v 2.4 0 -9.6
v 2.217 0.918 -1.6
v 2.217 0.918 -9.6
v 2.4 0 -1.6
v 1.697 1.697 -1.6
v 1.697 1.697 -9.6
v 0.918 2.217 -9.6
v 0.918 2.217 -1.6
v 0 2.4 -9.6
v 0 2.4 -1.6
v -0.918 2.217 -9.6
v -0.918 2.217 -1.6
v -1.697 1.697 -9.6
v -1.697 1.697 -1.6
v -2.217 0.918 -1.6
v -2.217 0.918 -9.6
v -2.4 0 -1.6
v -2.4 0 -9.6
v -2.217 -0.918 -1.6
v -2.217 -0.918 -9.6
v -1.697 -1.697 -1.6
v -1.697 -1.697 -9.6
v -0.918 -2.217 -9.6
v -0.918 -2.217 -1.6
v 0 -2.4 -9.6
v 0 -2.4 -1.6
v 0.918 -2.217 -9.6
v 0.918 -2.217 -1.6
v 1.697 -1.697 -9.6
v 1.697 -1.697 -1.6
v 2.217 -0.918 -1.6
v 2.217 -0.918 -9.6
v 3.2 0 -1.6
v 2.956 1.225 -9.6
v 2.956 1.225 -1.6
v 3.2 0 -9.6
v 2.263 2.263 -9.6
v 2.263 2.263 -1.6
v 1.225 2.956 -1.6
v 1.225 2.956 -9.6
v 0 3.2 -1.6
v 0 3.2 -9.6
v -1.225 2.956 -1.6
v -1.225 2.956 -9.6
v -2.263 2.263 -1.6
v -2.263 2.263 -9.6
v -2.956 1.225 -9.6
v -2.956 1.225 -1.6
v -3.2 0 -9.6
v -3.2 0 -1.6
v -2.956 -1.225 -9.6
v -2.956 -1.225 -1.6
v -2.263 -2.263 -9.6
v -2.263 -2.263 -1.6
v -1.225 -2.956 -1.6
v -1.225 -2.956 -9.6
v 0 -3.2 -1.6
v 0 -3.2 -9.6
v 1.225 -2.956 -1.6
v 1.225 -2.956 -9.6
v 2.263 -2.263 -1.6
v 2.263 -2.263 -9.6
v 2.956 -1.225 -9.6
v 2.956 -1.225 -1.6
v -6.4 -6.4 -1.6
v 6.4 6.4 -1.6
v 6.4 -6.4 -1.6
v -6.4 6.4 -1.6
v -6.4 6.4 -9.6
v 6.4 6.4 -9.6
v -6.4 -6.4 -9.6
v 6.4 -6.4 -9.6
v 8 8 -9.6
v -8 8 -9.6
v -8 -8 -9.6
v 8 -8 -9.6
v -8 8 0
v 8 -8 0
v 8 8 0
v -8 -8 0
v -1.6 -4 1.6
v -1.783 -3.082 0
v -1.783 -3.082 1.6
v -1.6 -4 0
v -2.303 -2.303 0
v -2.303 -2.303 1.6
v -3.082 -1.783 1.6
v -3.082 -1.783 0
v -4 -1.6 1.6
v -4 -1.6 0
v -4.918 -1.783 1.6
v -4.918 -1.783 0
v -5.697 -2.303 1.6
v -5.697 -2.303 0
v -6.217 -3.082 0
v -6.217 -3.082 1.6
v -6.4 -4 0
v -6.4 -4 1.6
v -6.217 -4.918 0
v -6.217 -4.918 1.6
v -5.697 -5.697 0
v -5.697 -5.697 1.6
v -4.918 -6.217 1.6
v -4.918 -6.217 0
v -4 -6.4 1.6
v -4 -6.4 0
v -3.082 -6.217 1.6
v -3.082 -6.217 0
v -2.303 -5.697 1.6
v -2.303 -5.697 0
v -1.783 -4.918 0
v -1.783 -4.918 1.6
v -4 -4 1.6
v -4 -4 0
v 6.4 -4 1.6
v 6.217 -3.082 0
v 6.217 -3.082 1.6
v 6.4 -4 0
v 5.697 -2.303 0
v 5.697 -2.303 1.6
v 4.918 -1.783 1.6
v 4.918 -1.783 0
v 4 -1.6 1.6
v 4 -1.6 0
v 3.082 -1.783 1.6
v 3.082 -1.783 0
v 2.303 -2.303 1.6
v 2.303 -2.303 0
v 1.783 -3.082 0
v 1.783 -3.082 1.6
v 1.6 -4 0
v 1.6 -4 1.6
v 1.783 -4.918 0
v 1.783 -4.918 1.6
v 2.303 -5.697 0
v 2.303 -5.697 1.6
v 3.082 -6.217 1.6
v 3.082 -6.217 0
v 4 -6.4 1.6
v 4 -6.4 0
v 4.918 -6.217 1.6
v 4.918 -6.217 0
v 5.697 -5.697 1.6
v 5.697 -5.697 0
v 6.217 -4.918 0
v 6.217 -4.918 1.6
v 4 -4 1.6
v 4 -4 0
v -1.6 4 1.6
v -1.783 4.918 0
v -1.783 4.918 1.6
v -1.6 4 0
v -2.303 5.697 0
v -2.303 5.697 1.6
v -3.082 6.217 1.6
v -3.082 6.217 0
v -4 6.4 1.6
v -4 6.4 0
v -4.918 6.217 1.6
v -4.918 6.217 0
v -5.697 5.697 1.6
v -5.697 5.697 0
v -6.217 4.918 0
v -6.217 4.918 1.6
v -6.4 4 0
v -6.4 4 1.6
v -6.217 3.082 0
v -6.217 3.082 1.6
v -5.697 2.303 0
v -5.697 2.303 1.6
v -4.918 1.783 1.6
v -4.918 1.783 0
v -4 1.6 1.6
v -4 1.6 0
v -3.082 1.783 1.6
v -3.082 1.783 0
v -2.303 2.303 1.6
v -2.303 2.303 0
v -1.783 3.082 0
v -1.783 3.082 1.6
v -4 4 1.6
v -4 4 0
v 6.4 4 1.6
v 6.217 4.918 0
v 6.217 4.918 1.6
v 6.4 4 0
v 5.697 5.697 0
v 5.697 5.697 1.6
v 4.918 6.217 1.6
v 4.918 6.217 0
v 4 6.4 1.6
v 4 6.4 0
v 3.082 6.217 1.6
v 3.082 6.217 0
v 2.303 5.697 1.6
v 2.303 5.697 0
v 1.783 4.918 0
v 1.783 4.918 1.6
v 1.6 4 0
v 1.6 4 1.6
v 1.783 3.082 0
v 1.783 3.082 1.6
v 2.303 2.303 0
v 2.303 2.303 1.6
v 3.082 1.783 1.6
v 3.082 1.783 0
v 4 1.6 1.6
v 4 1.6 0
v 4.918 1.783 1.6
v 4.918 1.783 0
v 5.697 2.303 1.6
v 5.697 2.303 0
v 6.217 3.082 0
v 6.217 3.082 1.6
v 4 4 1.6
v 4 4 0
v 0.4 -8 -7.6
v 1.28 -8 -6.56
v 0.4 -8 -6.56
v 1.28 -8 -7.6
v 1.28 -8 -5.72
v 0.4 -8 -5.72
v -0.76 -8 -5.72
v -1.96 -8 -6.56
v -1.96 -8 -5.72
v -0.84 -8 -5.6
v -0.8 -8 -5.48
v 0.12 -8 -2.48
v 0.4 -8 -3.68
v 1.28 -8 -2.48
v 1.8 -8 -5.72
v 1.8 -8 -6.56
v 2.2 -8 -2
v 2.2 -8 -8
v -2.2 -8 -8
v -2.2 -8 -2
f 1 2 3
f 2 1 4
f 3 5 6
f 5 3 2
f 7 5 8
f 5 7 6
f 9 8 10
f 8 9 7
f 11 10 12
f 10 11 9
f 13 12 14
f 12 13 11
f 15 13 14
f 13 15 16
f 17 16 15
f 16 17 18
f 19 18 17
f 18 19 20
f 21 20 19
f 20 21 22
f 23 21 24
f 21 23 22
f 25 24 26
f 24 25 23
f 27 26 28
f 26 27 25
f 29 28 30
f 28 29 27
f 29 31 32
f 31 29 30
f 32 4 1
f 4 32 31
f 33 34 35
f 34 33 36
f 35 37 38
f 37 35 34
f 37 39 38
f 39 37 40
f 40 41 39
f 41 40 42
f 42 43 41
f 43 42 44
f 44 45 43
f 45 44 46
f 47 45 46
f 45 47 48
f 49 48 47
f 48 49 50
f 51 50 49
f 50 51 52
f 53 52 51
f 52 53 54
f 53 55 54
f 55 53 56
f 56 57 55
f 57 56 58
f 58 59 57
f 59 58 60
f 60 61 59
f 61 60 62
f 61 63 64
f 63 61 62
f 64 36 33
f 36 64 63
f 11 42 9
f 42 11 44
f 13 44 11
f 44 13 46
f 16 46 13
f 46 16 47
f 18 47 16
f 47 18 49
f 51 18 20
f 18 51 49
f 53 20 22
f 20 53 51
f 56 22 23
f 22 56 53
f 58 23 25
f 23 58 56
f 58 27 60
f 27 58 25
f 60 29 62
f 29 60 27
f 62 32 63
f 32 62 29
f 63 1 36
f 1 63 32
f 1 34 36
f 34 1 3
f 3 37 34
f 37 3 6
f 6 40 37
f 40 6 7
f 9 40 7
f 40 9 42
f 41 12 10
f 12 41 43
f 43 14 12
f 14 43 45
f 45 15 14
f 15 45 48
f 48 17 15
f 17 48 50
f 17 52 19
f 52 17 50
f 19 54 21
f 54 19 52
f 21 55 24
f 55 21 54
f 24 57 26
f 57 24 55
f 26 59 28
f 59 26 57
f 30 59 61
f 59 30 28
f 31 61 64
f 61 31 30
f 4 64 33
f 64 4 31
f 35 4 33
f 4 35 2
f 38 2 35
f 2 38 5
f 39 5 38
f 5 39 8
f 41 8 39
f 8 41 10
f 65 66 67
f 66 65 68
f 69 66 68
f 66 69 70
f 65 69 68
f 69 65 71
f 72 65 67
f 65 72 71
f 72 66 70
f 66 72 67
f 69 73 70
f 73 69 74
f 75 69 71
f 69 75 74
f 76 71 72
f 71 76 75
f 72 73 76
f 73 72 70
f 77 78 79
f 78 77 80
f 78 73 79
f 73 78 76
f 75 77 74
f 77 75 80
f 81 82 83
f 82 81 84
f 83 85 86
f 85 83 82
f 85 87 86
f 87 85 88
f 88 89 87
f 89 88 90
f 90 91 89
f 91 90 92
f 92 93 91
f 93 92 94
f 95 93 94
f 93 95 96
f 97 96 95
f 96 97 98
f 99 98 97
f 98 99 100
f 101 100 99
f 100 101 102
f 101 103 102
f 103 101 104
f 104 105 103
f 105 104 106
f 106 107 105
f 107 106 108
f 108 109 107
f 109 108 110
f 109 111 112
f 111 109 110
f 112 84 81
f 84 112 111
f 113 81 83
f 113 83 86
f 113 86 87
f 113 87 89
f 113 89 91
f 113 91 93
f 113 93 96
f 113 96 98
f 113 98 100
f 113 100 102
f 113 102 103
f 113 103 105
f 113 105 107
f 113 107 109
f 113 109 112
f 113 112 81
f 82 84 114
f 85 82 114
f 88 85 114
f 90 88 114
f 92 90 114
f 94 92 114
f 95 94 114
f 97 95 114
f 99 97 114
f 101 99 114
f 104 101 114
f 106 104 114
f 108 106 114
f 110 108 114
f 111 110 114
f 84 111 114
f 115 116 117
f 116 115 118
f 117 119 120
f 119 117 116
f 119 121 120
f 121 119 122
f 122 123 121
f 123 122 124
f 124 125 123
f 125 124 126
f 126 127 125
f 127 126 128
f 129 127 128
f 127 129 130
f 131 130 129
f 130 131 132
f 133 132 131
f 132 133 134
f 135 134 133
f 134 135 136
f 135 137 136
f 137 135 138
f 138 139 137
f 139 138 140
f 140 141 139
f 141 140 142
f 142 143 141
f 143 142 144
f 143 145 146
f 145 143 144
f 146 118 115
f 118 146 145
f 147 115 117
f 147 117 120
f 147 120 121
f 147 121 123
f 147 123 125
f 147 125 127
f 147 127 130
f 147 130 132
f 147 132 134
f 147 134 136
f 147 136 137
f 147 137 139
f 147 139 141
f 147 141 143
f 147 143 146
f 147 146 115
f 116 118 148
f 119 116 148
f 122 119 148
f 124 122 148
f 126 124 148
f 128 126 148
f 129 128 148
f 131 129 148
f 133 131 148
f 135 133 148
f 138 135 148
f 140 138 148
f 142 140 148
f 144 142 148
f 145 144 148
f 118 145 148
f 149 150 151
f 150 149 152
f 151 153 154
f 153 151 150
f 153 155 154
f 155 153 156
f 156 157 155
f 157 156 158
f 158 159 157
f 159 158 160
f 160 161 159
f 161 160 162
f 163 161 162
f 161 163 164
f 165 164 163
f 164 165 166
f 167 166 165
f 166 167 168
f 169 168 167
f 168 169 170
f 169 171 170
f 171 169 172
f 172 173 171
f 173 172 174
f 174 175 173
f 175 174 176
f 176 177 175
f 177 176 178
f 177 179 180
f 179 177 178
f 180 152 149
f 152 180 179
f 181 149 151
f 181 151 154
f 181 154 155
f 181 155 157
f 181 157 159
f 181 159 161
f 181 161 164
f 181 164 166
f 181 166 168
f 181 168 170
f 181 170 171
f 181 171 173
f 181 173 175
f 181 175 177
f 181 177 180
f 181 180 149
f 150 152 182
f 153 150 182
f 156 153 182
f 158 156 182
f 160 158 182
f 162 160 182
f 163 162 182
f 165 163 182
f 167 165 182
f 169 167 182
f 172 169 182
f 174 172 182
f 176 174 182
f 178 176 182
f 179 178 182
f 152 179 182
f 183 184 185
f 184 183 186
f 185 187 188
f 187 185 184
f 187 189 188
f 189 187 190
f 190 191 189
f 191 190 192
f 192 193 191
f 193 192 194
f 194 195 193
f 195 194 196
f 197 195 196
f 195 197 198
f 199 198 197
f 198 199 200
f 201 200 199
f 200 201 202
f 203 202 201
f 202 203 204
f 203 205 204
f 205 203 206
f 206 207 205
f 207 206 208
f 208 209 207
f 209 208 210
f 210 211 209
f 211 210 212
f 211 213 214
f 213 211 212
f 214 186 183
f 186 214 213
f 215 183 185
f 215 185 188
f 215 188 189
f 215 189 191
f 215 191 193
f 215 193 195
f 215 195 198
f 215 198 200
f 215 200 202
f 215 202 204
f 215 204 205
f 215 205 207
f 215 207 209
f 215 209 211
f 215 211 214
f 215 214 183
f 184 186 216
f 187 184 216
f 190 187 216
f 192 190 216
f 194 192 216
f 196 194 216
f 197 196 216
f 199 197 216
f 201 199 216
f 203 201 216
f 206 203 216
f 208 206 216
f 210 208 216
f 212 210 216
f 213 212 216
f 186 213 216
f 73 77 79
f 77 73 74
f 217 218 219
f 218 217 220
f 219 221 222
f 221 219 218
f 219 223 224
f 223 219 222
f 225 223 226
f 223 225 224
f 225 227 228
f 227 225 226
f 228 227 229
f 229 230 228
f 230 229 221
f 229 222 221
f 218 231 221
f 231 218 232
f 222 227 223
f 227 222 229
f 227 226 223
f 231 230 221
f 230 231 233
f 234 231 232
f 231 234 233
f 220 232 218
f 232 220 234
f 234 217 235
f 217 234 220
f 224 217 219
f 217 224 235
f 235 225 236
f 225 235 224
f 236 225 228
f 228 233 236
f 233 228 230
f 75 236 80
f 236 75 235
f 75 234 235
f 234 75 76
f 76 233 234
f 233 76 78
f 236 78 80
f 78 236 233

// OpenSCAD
// file: ../p/4-4disc.scad
use <../lib.scad>
function ldraw_lib__4_4disc() = [
// 0 Disc 1.0
// 0 Name: 4-4disc.dat
// 0 Author: James Jessiman
// 0 !LDRAW_ORG Primitive UPDATE 2002-02
// 0 !LICENSE Licensed under CC BY 2.0 and CC BY 4.0 : see CAreadme.txt
// 
// 0 BFC CERTIFY CCW
  [0,"BFC","CERTIFY"],
  [0,"BFC","CCW"],
// 
// 0 !HISTORY 1998-12-15 [PTadmin] Official Update 1998-10
// 0 !HISTORY 2002-03-23 [sbliss] Added BFC statement
// 0 !HISTORY 2002-04-25 [PTadmin] Official Update 2002-02
// 0 !HISTORY 2007-06-24 [PTadmin] Header formatted for Contributor Agreement
// 0 !HISTORY 2008-07-01 [PTadmin] Official Update 2008-01
// 
// 
// 3 16 0 0 0 1 0 0 0.9239 0 0.3827
  [3,16,0,0,0,1,0,0,0.9239,0,0.3827],
// 3 16 0 0 0 0.9239 0 0.3827 0.7071 0 0.7071
  [3,16,0,0,0,0.9239,0,0.3827,0.7071,0,0.7071],
// 3 16 0 0 0 0.7071 0 0.7071 0.3827 0 0.9239
  [3,16,0,0,0,0.7071,0,0.7071,0.3827,0,0.9239],
// 3 16 0 0 0 0.3827 0 0.9239 0 0 1
  [3,16,0,0,0,0.3827,0,0.9239,0,0,1],
// 3 16 0 0 0 0 0 1 -0.3827 0 0.9239
  [3,16,0,0,0,0,0,1,-0.3827,0,0.9239],
// 3 16 0 0 0 -0.3827 0 0.9239 -0.7071 0 0.7071
  [3,16,0,0,0,-0.3827,0,0.9239,-0.7071,0,0.7071],
// 3 16 0 0 0 -0.7071 0 0.7071 -0.9239 0 0.3827
  [3,16,0,0,0,-0.7071,0,0.7071,-0.9239,0,0.3827],
// 3 16 0 0 0 -0.9239 0 0.3827 -1 0 -0
  [3,16,0,0,0,-0.9239,0,0.3827,-1,0,-0],
// 3 16 0 0 0 -1 0 -0 -0.9239 0 -0.3827
  [3,16,0,0,0,-1,0,-0,-0.9239,0,-0.3827],
// 3 16 0 0 0 -0.9239 0 -0.3827 -0.7071 0 -0.7071
  [3,16,0,0,0,-0.9239,0,-0.3827,-0.7071,0,-0.7071],
// 3 16 0 0 0 -0.7071 0 -0.7071 -0.3827 0 -0.9239
  [3,16,0,0,0,-0.7071,0,-0.7071,-0.3827,0,-0.9239],
// 3 16 0 0 0 -0.3827 0 -0.9239 0 0 -1
  [3,16,0,0,0,-0.3827,0,-0.9239,0,0,-1],
// 3 16 0 0 0 0 0 -1 0.3827 0 -0.9239
  [3,16,0,0,0,0,0,-1,0.3827,0,-0.9239],
// 3 16 0 0 0 0.3827 0 -0.9239 0.7071 0 -0.7071
  [3,16,0,0,0,0.3827,0,-0.9239,0.7071,0,-0.7071],
// 3 16 0 0 0 0.7071 0 -0.7071 0.9239 0 -0.3827
  [3,16,0,0,0,0.7071,0,-0.7071,0.9239,0,-0.3827],
// 3 16 0 0 0 0.9239 0 -0.3827 1 0 0
  [3,16,0,0,0,0.9239,0,-0.3827,1,0,0],
// 0
];
module ldraw_lib__4_4disc(step=0, col=false, unit=2/5, alt=false, line=0.2, solid=!$preview)
    makepoly(ldraw_lib__4_4disc(), step=step, col=col, unit=unit, alt=alt, line=line, solid=solid);
ldraw_lib__4_4disc(line=0.2);
// file: ../p/stud.scad
use <../lib.scad>
use <4-4cyli.scad>
use <4-4disc.scad>
use <4-4edge.scad>
function ldraw_lib__stud() = [
// 0 Stud
// 0 Name: stud.dat
// 0 Author: James Jessiman
// 0 !LDRAW_ORG Primitive UPDATE 2012-01
// 0 !LICENSE Licensed under CC BY 4.0 : see CAreadme.txt
// 
// 0 BFC CERTIFY CCW
  [0,"BFC","CERTIFY"],
  [0,"BFC","CCW"],
// 
// 0 !HISTORY 2002-04-04 [sbliss] Modified for BFC compliance
// 0 !HISTORY 2002-04-25 [PTadmin] Official Update 2002-02
// 0 !HISTORY 2007-06-24 [PTadmin] Header formatted for Contributor Agreement
// 0 !HISTORY 2008-07-01 [PTadmin] Official Update 2008-01
// 0 !HISTORY 2012-02-16 [Philo] Changed to CCW
// 0 !HISTORY 2012-03-30 [PTadmin] Official Update 2012-01
// 
// 
// 1 16 0 0 0 6 0 0 0 1 0 0 0 6 4-4edge.dat
  [1,16,0,0,0,6,0,0,0,1,0,0,0,6, ldraw_lib__4_4edge()],
// 1 16 0 -4 0 6 0 0 0 1 0 0 0 6 4-4edge.dat
  [1,16,0,-4,0,6,0,0,0,1,0,0,0,6, ldraw_lib__4_4edge()],
// 1 16 0 0 0 6 0 0 0 -4 0 0 0 6 4-4cyli.dat
  [1,16,0,0,0,6,0,0,0,-4,0,0,0,6, ldraw_lib__4_4cyli()],
// 1 16 0 -4 0 6 0 0 0 1 0 0 0 6 4-4disc.dat
  [1,16,0,-4,0,6,0,0,0,1,0,0,0,6, ldraw_lib__4_4disc()],
  [-1,16,0,0,0,6,0,0,0,-1,0,0,0,6, ldraw_lib__4_4disc()],
];
module ldraw_lib__stud(step=0, col=false, unit=2/5, alt=false, line=0.2, solid=!$preview)
    makepoly(ldraw_lib__stud(), step=step, col=col, unit=unit, alt=alt, line=line, solid=solid);
ldraw_lib__stud(line=0.2);
// file: ../p/4-4ring3.scad
use <../lib.scad>
$fa=1; $fs=0.2;
function ldraw_lib__4_4ring3(realsolid=false) = [
// 0 Ring  3 x 1.0
// 0 Name: 4-4ring3.dat
// 0 Author: James Jessiman
// 0 !LDRAW_ORG Primitive UPDATE 2009-01
// 0 !LICENSE Licensed under CC BY 2.0 and CC BY 4.0 : see CAreadme.txt
// 
// 0 BFC CERTIFY CCW
  [0,"BFC","CERTIFY"],
  [0,"BFC","CCW"],
// 
// 0 !HISTORY 1998-12-15 [PTadmin] Official Update 1998-10
// 0 !HISTORY 2002-04-05 [hafhead] Added BFC statement
// 0 !HISTORY 2002-04-25 [PTadmin] Official Update 2002-02
// 0 !HISTORY 2007-06-24 [PTadmin] Header formatted for Contributor Agreement
// 0 !HISTORY 2008-07-01 [PTadmin] Official Update 2008-01
// 0 !HISTORY 2008-08-26 [cwdee] Switch polygon winding and rename
// 0 !HISTORY 2009-05-02 [PTadmin] Official Update 2009-01
// 
// 
// 4 16 -1.5308 0 3.6956 -1.1481 0 2.7717 0 0 3 0 0 4
  [4,16,-1.5308,0,3.6956,-1.1481,0,2.7717,0,0,3,0,0,4],
// 4 16 -2.8284 0 2.8284 -2.1213 0 2.1213 -1.1481 0 2.7717 -1.5308 0 3.6956
  [4,16,-2.8284,0,2.8284,-2.1213,0,2.1213,-1.1481,0,2.7717,-1.5308,0,3.6956],
// 4 16 -3.6956 0 1.5308 -2.7717 0 1.1481 -2.1213 0 2.1213 -2.8284 0 2.8284
  [4,16,-3.6956,0,1.5308,-2.7717,0,1.1481,-2.1213,0,2.1213,-2.8284,0,2.8284],
// 4 16 -4 0 0 -3 0 0 -2.7717 0 1.1481 -3.6956 0 1.5308
  [4,16,-4,0,0,-3,0,0,-2.7717,0,1.1481,-3.6956,0,1.5308],
// 4 16 -3.6956 0 -1.5308 -2.7717 0 -1.1481 -3 0 0 -4 0 0
  [4,16,-3.6956,0,-1.5308,-2.7717,0,-1.1481,-3,0,0,-4,0,0],
// 4 16 -2.8284 0 -2.8284 -2.1213 0 -2.1213 -2.7717 0 -1.1481 -3.6956 0 -1.5308
  [4,16,-2.8284,0,-2.8284,-2.1213,0,-2.1213,-2.7717,0,-1.1481,-3.6956,0,-1.5308],
// 4 16 -1.5308 0 -3.6956 -1.1481 0 -2.7717 -2.1213 0 -2.1213 -2.8284 0 -2.8284
  [4,16,-1.5308,0,-3.6956,-1.1481,0,-2.7717,-2.1213,0,-2.1213,-2.8284,0,-2.8284],
// 4 16 0 0 -4 0 0 -3 -1.1481 0 -2.7717 -1.5308 0 -3.6956
  [4,16,0,0,-4,0,0,-3,-1.1481,0,-2.7717,-1.5308,0,-3.6956],
// 4 16 1.5308 0 -3.6956 1.1481 0 -2.7717 0 0 -3 0 0 -4
  [4,16,1.5308,0,-3.6956,1.1481,0,-2.7717,0,0,-3,0,0,-4],
// 4 16 2.8284 0 -2.8284 2.1213 0 -2.1213 1.1481 0 -2.7717 1.5308 0 -3.6956
  [4,16,2.8284,0,-2.8284,2.1213,0,-2.1213,1.1481,0,-2.7717,1.5308,0,-3.6956],
// 4 16 3.6956 0 -1.5308 2.7717 0 -1.1481 2.1213 0 -2.1213 2.8284 0 -2.8284
  [4,16,3.6956,0,-1.5308,2.7717,0,-1.1481,2.1213,0,-2.1213,2.8284,0,-2.8284],
// 4 16 4 0 0 3 0 0 2.7717 0 -1.1481 3.6956 0 -1.5308
  [4,16,4,0,0,3,0,0,2.7717,0,-1.1481,3.6956,0,-1.5308],
// 4 16 3.6956 0 1.5308 2.7717 0 1.1481 3 0 0 4 0 0
  [4,16,3.6956,0,1.5308,2.7717,0,1.1481,3,0,0,4,0,0],
// 4 16 2.8284 0 2.8284 2.1213 0 2.1213 2.7717 0 1.1481 3.6956 0 1.5308
  [4,16,2.8284,0,2.8284,2.1213,0,2.1213,2.7717,0,1.1481,3.6956,0,1.5308],
// 4 16 1.5308 0 3.6956 1.1481 0 2.7717 2.1213 0 2.1213 2.8284 0 2.8284
  [4,16,1.5308,0,3.6956,1.1481,0,2.7717,2.1213,0,2.1213,2.8284,0,2.8284],
// 4 16 0 0 4 0 0 3 1.1481 0 2.7717 1.5308 0 3.6956
  [4,16,0,0,4,0,0,3,1.1481,0,2.7717,1.5308,0,3.6956],
// 0
];
module ldraw_lib__4_4ring3(step=0, col=false, unit=2/5, alt=false, line=0.2, solid=!$preview)
    makepoly(ldraw_lib__4_4ring3(solid), step=step, col=col, unit=unit, alt=alt, line=line, solid=solid);
ldraw_lib__4_4ring3(line=0.2);
// file: ../p/4-4edge.scad
use <../lib.scad>
function ldraw_lib__4_4edge() = [
// 0 Circle 1.0
// 0 Name: 4-4edge.dat
// 0 Author: James Jessiman
// 0 !LDRAW_ORG Primitive UPDATE 2017-01
// 0 !LICENSE Licensed under CC BY 2.0 and CC BY 4.0 : see CAreadme.txt
// 
// 0 BFC CERTIFY CCW
  [0,"BFC","CERTIFY"],
  [0,"BFC","CCW"],
// 
// 0 !HISTORY 1998-12-15 [PTadmin] Official Update 1998-10
// 0 !HISTORY 2005-12-28 [PTadmin] Official Update 2005-01
// 0 !HISTORY 2007-06-24 [PTadmin] Header formatted for Contributor Agreement
// 0 !HISTORY 2008-07-01 [PTadmin] Official Update 2008-01
// 0 !HISTORY 2017-01-15 [Steffen] BFCed
// 0 !HISTORY 2017-12-30 [PTadmin] Official Update 2017-01
// 
// 
// 2 24 1 0 0 0.9239 0 0.3827
  [2,24,1,0,0,0.9239,0,0.3827],
// 2 24 0.9239 0 0.3827 0.7071 0 0.7071
  [2,24,0.9239,0,0.3827,0.7071,0,0.7071],
// 2 24 0.7071 0 0.7071 0.3827 0 0.9239
  [2,24,0.7071,0,0.7071,0.3827,0,0.9239],
// 2 24 0.3827 0 0.9239 0 0 1
  [2,24,0.3827,0,0.9239,0,0,1],
// 2 24 0 0 1 -0.3827 0 0.9239
  [2,24,0,0,1,-0.3827,0,0.9239],
// 2 24 -0.3827 0 0.9239 -0.7071 0 0.7071
  [2,24,-0.3827,0,0.9239,-0.7071,0,0.7071],
// 2 24 -0.7071 0 0.7071 -0.9239 0 0.3827
  [2,24,-0.7071,0,0.7071,-0.9239,0,0.3827],
// 2 24 -0.9239 0 0.3827 -1 0 -0
  [2,24,-0.9239,0,0.3827,-1,0,-0],
// 2 24 -1 0 -0 -0.9239 0 -0.3827
  [2,24,-1,0,-0,-0.9239,0,-0.3827],
// 2 24 -0.9239 0 -0.3827 -0.7071 0 -0.7071
  [2,24,-0.9239,0,-0.3827,-0.7071,0,-0.7071],
// 2 24 -0.7071 0 -0.7071 -0.3827 0 -0.9239
  [2,24,-0.7071,0,-0.7071,-0.3827,0,-0.9239],
// 2 24 -0.3827 0 -0.9239 0 0 -1
  [2,24,-0.3827,0,-0.9239,0,0,-1],
// 2 24 0 0 -1 0.3827 0 -0.9239
  [2,24,0,0,-1,0.3827,0,-0.9239],
// 2 24 0.3827 0 -0.9239 0.7071 0 -0.7071
  [2,24,0.3827,0,-0.9239,0.7071,0,-0.7071],
// 2 24 0.7071 0 -0.7071 0.9239 0 -0.3827
  [2,24,0.7071,0,-0.7071,0.9239,0,-0.3827],
// 2 24 0.9239 0 -0.3827 1 0 0
  [2,24,0.9239,0,-0.3827,1,0,0],
];
module ldraw_lib__4_4edge(step=0, col=false, unit=2/5, alt=false, line=0.2, solid=!$preview)
    makepoly(ldraw_lib__4_4edge(), step=step, col=col, unit=unit, alt=alt, line=line, solid=solid);
ldraw_lib__4_4edge(line=0.2);
// file: ../p/4-4cyli.scad
use <../lib.scad>
$fa=1; $fs=0.2;
function ldraw_lib__4_4cyli(realsolid=false) = [
// 0 Cylinder 1.0
// 0 Name: 4-4cyli.dat
// 0 Author: James Jessiman
// 0 !LDRAW_ORG Primitive UPDATE 2005-01
// 0 !LICENSE Licensed under CC BY 2.0 and CC BY 4.0 : see CAreadme.txt
// 
// 0 BFC CERTIFY CCW
  [0,"BFC","CERTIFY"],
  [0,"BFC","CCW"],
// 
// 0 !HISTORY 1998-12-15 [PTadmin] Official Update 1998-10
// 0 !HISTORY 2002-03-23 [sbliss] Added BFC statement; merged headers from files in distributions LDraw 0.27 and Complete.
// 0 !HISTORY 2002-04-25 [PTadmin] Official Update 2002-02
// 0 !HISTORY 2004-12-14 [guyvivan] BFC CCW
// 0 !HISTORY 2005-12-28 [PTadmin] Official Update 2005-01
// 0 !HISTORY 2007-06-24 [PTadmin] Header formatted for Contributor Agreement
// 0 !HISTORY 2008-07-01 [PTadmin] Official Update 2008-01
// 
// 
// 4 16 1 1 0 0.9239 1 0.3827 0.9239 0 0.3827 1 0 0
  [4,16,1,1,0,0.9239,1,0.3827,0.9239,0,0.3827,1,0,0],
// 5 24 1 0 0 1 1 0 0.9239 0 0.3827 0.9239 0 -0.3827
  [5,24,1,0,0,1,1,0,0.9239,0,0.3827,0.9239,0,-0.3827],
// 4 16 0.9239 1 0.3827 0.7071 1 0.7071 0.7071 0 0.7071 0.9239 0 0.3827
  [4,16,0.9239,1,0.3827,0.7071,1,0.7071,0.7071,0,0.7071,0.9239,0,0.3827],
// 5 24 0.9239 0 0.3827 0.9239 1 0.3827 0.7071 0 0.7071 1 0 0
  [5,24,0.9239,0,0.3827,0.9239,1,0.3827,0.7071,0,0.7071,1,0,0],
// 4 16 0.7071 1 0.7071 0.3827 1 0.9239 0.3827 0 0.9239 0.7071 0 0.7071
  [4,16,0.7071,1,0.7071,0.3827,1,0.9239,0.3827,0,0.9239,0.7071,0,0.7071],
// 5 24 0.7071 0 0.7071 0.7071 1 0.7071 0.3827 0 0.9239 0.9239 0 0.3827
  [5,24,0.7071,0,0.7071,0.7071,1,0.7071,0.3827,0,0.9239,0.9239,0,0.3827],
// 4 16 0.3827 1 0.9239 0 1 1 0 0 1 0.3827 0 0.9239
  [4,16,0.3827,1,0.9239,0,1,1,0,0,1,0.3827,0,0.9239],
// 5 24 0.3827 0 0.9239 0.3827 1 0.9239 0 0 1 0.7071 0 0.7071
  [5,24,0.3827,0,0.9239,0.3827,1,0.9239,0,0,1,0.7071,0,0.7071],
// 4 16 0 1 1 -0.3827 1 0.9239 -0.3827 0 0.9239 0 0 1
  [4,16,0,1,1,-0.3827,1,0.9239,-0.3827,0,0.9239,0,0,1],
// 5 24 0 0 1 0 1 1 -0.3827 0 0.9239 0.3827 0 0.9239
  [5,24,0,0,1,0,1,1,-0.3827,0,0.9239,0.3827,0,0.9239],
// 4 16 -0.3827 1 0.9239 -0.7071 1 0.7071 -0.7071 0 0.7071 -0.3827 0 0.9239
  [4,16,-0.3827,1,0.9239,-0.7071,1,0.7071,-0.7071,0,0.7071,-0.3827,0,0.9239],
// 5 24 -0.3827 0 0.9239 -0.3827 1 0.9239 -0.7071 0 0.7071 0 0 1
  [5,24,-0.3827,0,0.9239,-0.3827,1,0.9239,-0.7071,0,0.7071,0,0,1],
// 4 16 -0.7071 1 0.7071 -0.9239 1 0.3827 -0.9239 0 0.3827 -0.7071 0 0.7071
  [4,16,-0.7071,1,0.7071,-0.9239,1,0.3827,-0.9239,0,0.3827,-0.7071,0,0.7071],
// 5 24 -0.7071 0 0.7071 -0.7071 1 0.7071 -0.9239 0 0.3827 -0.3827 0 0.9239
  [5,24,-0.7071,0,0.7071,-0.7071,1,0.7071,-0.9239,0,0.3827,-0.3827,0,0.9239],
// 4 16 -0.9239 1 0.3827 -1 1 0 -1 0 0 -0.9239 0 0.3827
  [4,16,-0.9239,1,0.3827,-1,1,0,-1,0,0,-0.9239,0,0.3827],
// 5 24 -0.9239 0 0.3827 -0.9239 1 0.3827 -1 0 0 -0.7071 0 0.7071
  [5,24,-0.9239,0,0.3827,-0.9239,1,0.3827,-1,0,0,-0.7071,0,0.7071],
// 4 16 -1 1 0 -0.9239 1 -0.3827 -0.9239 0 -0.3827 -1 0 0
  [4,16,-1,1,0,-0.9239,1,-0.3827,-0.9239,0,-0.3827,-1,0,0],
// 5 24 -1 0 0 -1 1 0 -0.9239 0 -0.3827 -0.9239 0 0.3827
  [5,24,-1,0,0,-1,1,0,-0.9239,0,-0.3827,-0.9239,0,0.3827],
// 4 16 -0.9239 1 -0.3827 -0.7071 1 -0.7071 -0.7071 0 -0.7071 -0.9239 0 -0.3827
  [4,16,-0.9239,1,-0.3827,-0.7071,1,-0.7071,-0.7071,0,-0.7071,-0.9239,0,-0.3827],
// 5 24 -0.9239 0 -0.3827 -0.9239 1 -0.3827 -0.7071 0 -0.7071 -1 0 0
  [5,24,-0.9239,0,-0.3827,-0.9239,1,-0.3827,-0.7071,0,-0.7071,-1,0,0],
// 4 16 -0.7071 1 -0.7071 -0.3827 1 -0.9239 -0.3827 0 -0.9239 -0.7071 0 -0.7071
  [4,16,-0.7071,1,-0.7071,-0.3827,1,-0.9239,-0.3827,0,-0.9239,-0.7071,0,-0.7071],
// 5 24 -0.7071 0 -0.7071 -0.7071 1 -0.7071 -0.3827 0 -0.9239 -0.9239 0 -0.3827
  [5,24,-0.7071,0,-0.7071,-0.7071,1,-0.7071,-0.3827,0,-0.9239,-0.9239,0,-0.3827],
// 4 16 -0.3827 1 -0.9239 0 1 -1 0 0 -1 -0.3827 0 -0.9239
  [4,16,-0.3827,1,-0.9239,0,1,-1,0,0,-1,-0.3827,0,-0.9239],
// 5 24 -0.3827 0 -0.9239 -0.3827 1 -0.9239 0 0 -1 -0.7071 0 -0.7071
  [5,24,-0.3827,0,-0.9239,-0.3827,1,-0.9239,0,0,-1,-0.7071,0,-0.7071],
// 4 16 0 1 -1 0.3827 1 -0.9239 0.3827 0 -0.9239 0 0 -1
  [4,16,0,1,-1,0.3827,1,-0.9239,0.3827,0,-0.9239,0,0,-1],
// 5 24 0 0 -1 0 1 -1 0.3827 0 -0.9239 -0.3827 0 -0.9239
  [5,24,0,0,-1,0,1,-1,0.3827,0,-0.9239,-0.3827,0,-0.9239],
// 4 16 0.3827 1 -0.9239 0.7071 1 -0.7071 0.7071 0 -0.7071 0.3827 0 -0.9239
  [4,16,0.3827,1,-0.9239,0.7071,1,-0.7071,0.7071,0,-0.7071,0.3827,0,-0.9239],
// 5 24 0.3827 0 -0.9239 0.3827 1 -0.9239 0.7071 0 -0.7071 0 0 -1
  [5,24,0.3827,0,-0.9239,0.3827,1,-0.9239,0.7071,0,-0.7071,0,0,-1],
// 4 16 0.7071 1 -0.7071 0.9239 1 -0.3827 0.9239 0 -0.3827 0.7071 0 -0.7071
  [4,16,0.7071,1,-0.7071,0.9239,1,-0.3827,0.9239,0,-0.3827,0.7071,0,-0.7071],
// 5 24 0.7071 0 -0.7071 0.7071 1 -0.7071 0.9239 0 -0.3827 0.3827 0 -0.9239
  [5,24,0.7071,0,-0.7071,0.7071,1,-0.7071,0.9239,0,-0.3827,0.3827,0,-0.9239],
// 4 16 0.9239 1 -0.3827 1 1 0 1 0 0 0.9239 0 -0.3827
  [4,16,0.9239,1,-0.3827,1,1,0,1,0,0,0.9239,0,-0.3827],
// 5 24 0.9239 0 -0.3827 0.9239 1 -0.3827 1 0 0 0.7071 0 -0.7071
  [5,24,0.9239,0,-0.3827,0.9239,1,-0.3827,1,0,0,0.7071,0,-0.7071],
// 0
];
module ldraw_lib__4_4cyli(step=0, col=false, unit=2/5, alt=false, line=0.2, solid=!$preview)
    makepoly(ldraw_lib__4_4cyli(solid), step=step, col=col, unit=unit, alt=alt, line=line, solid=solid);
ldraw_lib__4_4cyli(line=0.2);
// file: ../p/stug-2x2.scad
use <../lib.scad>
use <stud.scad>
function ldraw_lib__stug_2x2() = [
// 0 Stud Group  2 x  2
// 0 Name: stug-2x2.dat
// 0 Author: Steffen [Steffen]
// 0 !LDRAW_ORG Primitive UPDATE 2012-01
// 0 !LICENSE Licensed under CC BY 2.0 and CC BY 4.0 : see CAreadme.txt
// 
// 0 BFC CERTIFY CCW
  [0,"BFC","CERTIFY"],
  [0,"BFC","CCW"],
// 
// 0 !HISTORY 2005-12-28 [PTadmin] Official Update 2005-01
// 0 !HISTORY 2007-05-04 [PTadmin] Header formatted for Contributor Agreement
// 0 !HISTORY 2008-07-01 [PTadmin] Official Update 2008-01
// 0 !HISTORY 2011-07-01 [PTadmin] Renamed from stug2
// 0 !HISTORY 2011-07-25 [PTadmin] Official Update 2011-01
// 0 !HISTORY 2012-02-16 [Philo] Changed to CCW
// 0 !HISTORY 2012-03-30 [PTadmin] Official Update 2012-01
// 
// 
// 1 16 -10 0 -10 1 0 0 0 1 0 0 0 1 stud.dat
  [1,16,-10,0,-10,1,0,0,0,1,0,0,0,1, ldraw_lib__stud()],
// 1 16 10 0 -10 1 0 0 0 1 0 0 0 1 stud.dat
  [1,16,10,0,-10,1,0,0,0,1,0,0,0,1, ldraw_lib__stud()],
// 1 16 -10 0 10 1 0 0 0 1 0 0 0 1 stud.dat
  [1,16,-10,0,10,1,0,0,0,1,0,0,0,1, ldraw_lib__stud()],
// 1 16 10 0 10 1 0 0 0 1 0 0 0 1 stud.dat
  [1,16,10,0,10,1,0,0,0,1,0,0,0,1, ldraw_lib__stud()],
];
module ldraw_lib__stug_2x2(step=0, col=false, unit=2/5, alt=false, line=0.2, solid=!$preview)
    makepoly(ldraw_lib__stug_2x2(), step=step, col=col, unit=unit, alt=alt, line=line, solid=solid);
ldraw_lib__stug_2x2(line=0.2);
// file: ../p/stud4.scad
use <../lib.scad>
use <4-4cyli.scad>
use <4-4edge.scad>
use <4-4ring3.scad>
function ldraw_lib__stud4() = [
// 0 Stud Tube Open
// 0 Name: stud4.dat
// 0 Author: James Jessiman
// 0 !LDRAW_ORG Primitive UPDATE 2009-02
// 0 !LICENSE Licensed under CC BY 4.0 : see CAreadme.txt
// 
// 0 BFC CERTIFY CCW
  [0,"BFC","CERTIFY"],
  [0,"BFC","CCW"],
// 
// 0 !HISTORY 1999-07-05 [PTadmin] Official Update 1999-05
// 0 !HISTORY 2002-04-04 [sbliss] Modified for BFC compliance
// 0 !HISTORY 2002-04-25 [PTadmin] Official Update 2002-02
// 0 !HISTORY 2007-06-24 [PTadmin] Header formatted for Contributor Agreement
// 0 !HISTORY 2008-07-01 [PTadmin] Official Update 2008-01
// 0 !HISTORY 2009-06-21 [cwdee] Update ring references to 4-4ring
// 0 !HISTORY 2009-09-03 [PTadmin] Official Update 2009-02
// 
// 
// 1 16 0 -4 0 6 0 0 0 1 0 0 0 6 4-4edge.dat
  [1,16,0,-4,0,6,0,0,0,1,0,0,0,6, ldraw_lib__4_4edge()],
// 1 16 0 -4 0 8 0 0 0 1 0 0 0 8 4-4edge.dat
  [1,16,0,-4,0,8,0,0,0,1,0,0,0,8, ldraw_lib__4_4edge()],
// 1 16 0 0 0 6 0 0 0 1 0 0 0 6 4-4edge.dat
  [1,16,0,0,0,6,0,0,0,1,0,0,0,6, ldraw_lib__4_4edge()],
// 1 16 0 0 0 8 0 0 0 1 0 0 0 8 4-4edge.dat
  [1,16,0,0,0,8,0,0,0,1,0,0,0,8, ldraw_lib__4_4edge()],
// 0 BFC INVERTNEXT
  [0,"BFC","INVERTNEXT"],
// 1 16 0 -4 0 6 0 0 0 4 0 0 0 6 4-4cyli.dat
  [1,16,0,-4,0,6,0,0,0,4,0,0,0,6, ldraw_lib__4_4cyli()],
// 1 16 0 -4 0 8 0 0 0 4 0 0 0 8 4-4cyli.dat
  [1,16,0,-4,0,8,0,0,0,4,0,0,0,8, ldraw_lib__4_4cyli()],
// 1 16 0 -4 0 2 0 0 0 1 0 0 0 2 4-4ring3.dat
  [1,16,0,-4,0,2,0,0,0,1,0,0,0,2, ldraw_lib__4_4ring3()],
  [-1,16,0,0,0,2,0,0,0,-1,0,0,0,2, ldraw_lib__4_4ring3()],
// 0
];
module ldraw_lib__stud4(step=0, col=false, unit=2/5, alt=false, line=0.2, solid=!$preview)
    makepoly(ldraw_lib__stud4(), step=step, col=col, unit=unit, alt=alt, line=line, solid=solid);
ldraw_lib__stud4(line=0.2);
// file: ../p/box5.scad
use <../lib.scad>
function ldraw_lib__box5() = [
// 0 Box with 5 Faces and All Edges
// 0 Name: box5.dat
// 0 Author: James Jessiman
// 0 !LDRAW_ORG Primitive UPDATE 2012-01
// 0 !LICENSE Licensed under CC BY 2.0 and CC BY 4.0 : see CAreadme.txt
// 
// 0 BFC CERTIFY CCW
  [0,"BFC","CERTIFY"],
  [0,"BFC","CCW"],
// 
// 0 !HISTORY 2002-04-03 [sbliss] Modified for BFC compliance
// 0 !HISTORY 2002-04-25 [PTadmin] Official Update 2002-02
// 0 !HISTORY 2007-06-24 [PTadmin] Header formatted for Contributor Agreement
// 0 !HISTORY 2008-07-01 [PTadmin] Official Update 2008-01
// 0 !HISTORY 2012-02-16 [Philo] Changed to CCW
// 0 !HISTORY 2012-03-30 [PTadmin] Official Update 2012-01
// 
// 
// 2 24 1 1 1 -1 1 1
  [2,24,1,1,1,-1,1,1],
// 2 24 -1 1 1 -1 1 -1
  [2,24,-1,1,1,-1,1,-1],
// 2 24 -1 1 -1 1 1 -1
  [2,24,-1,1,-1,1,1,-1],
// 2 24 1 1 -1 1 1 1
  [2,24,1,1,-1,1,1,1],
// 2 24 1 0 1 -1 0 1
  [2,24,1,0,1,-1,0,1],
// 2 24 -1 0 1 -1 0 -1
  [2,24,-1,0,1,-1,0,-1],
// 2 24 -1 0 -1 1 0 -1
  [2,24,-1,0,-1,1,0,-1],
// 2 24 1 0 -1 1 0 1
  [2,24,1,0,-1,1,0,1],
// 2 24 1 0 1 1 1 1
  [2,24,1,0,1,1,1,1],
// 2 24 -1 0 1 -1 1 1
  [2,24,-1,0,1,-1,1,1],
// 2 24 1 0 -1 1 1 -1
  [2,24,1,0,-1,1,1,-1],
// 2 24 -1 0 -1 -1 1 -1
  [2,24,-1,0,-1,-1,1,-1],
// 4 16 -1 1 1 1 1 1 1 1 -1 -1 1 -1
  [4,16,-1,1,1,1,1,1,1,1,-1,-1,1,-1],
// 4 16 -1 1 1 -1 0 1 1 0 1 1 1 1
  [4,16,-1,1,1,-1,0,1,1,0,1,1,1,1],
// 4 16 -1 1 -1 -1 0 -1 -1 0 1 -1 1 1
  [4,16,-1,1,-1,-1,0,-1,-1,0,1,-1,1,1],
// 4 16 1 1 -1 1 0 -1 -1 0 -1 -1 1 -1
  [4,16,1,1,-1,1,0,-1,-1,0,-1,-1,1,-1],
// 4 16 1 1 1 1 0 1 1 0 -1 1 1 -1
  [4,16,1,1,1,1,0,1,1,0,-1,1,1,-1],
];
makepoly(ldraw_lib__box5(), line=0.2);
// file: ../p/box3u2p.scad
use <../lib.scad>
function ldraw_lib__box3u2p() = [
// 0 Box with 3 Faces without 2 Parallel Edges
// 0 Name: box3u2p.dat
// 0 Author: Niels Karsdorp [nielsk]
// 0 !LDRAW_ORG Primitive UPDATE 2012-01
// 0 !LICENSE Licensed under CC BY 2.0 and CC BY 4.0 : see CAreadme.txt
// 
// 0 BFC CERTIFY CCW
  [0,"BFC","CERTIFY"],
  [0,"BFC","CCW"],
// 
// 0 !HISTORY 2003-03-12 [PTadmin] Official Update 2003-01
// 0 !HISTORY 2007-06-24 [PTadmin] Header formatted for Contributor Agreement
// 0 !HISTORY 2008-07-01 [PTadmin] Official Update 2008-01
// 0 !HISTORY 2012-02-16 [Philo] Changed to CCW
// 0 !HISTORY 2012-03-30 [PTadmin] Official Update 2012-01
// 
// 
// 2 24 1 1 1 -1 1 1
  [2,24,1,1,1,-1,1,1],
// 2 24 -1 1 -1 1 1 -1
  [2,24,-1,1,-1,1,1,-1],
// 2 24 1 0 1 -1 0 1
  [2,24,1,0,1,-1,0,1],
// 2 24 -1 0 -1 1 0 -1
  [2,24,-1,0,-1,1,0,-1],
// 2 24 1 1 1 1 1 -1
  [2,24,1,1,1,1,1,-1],
// 2 24 -1 1 1 -1 1 -1
  [2,24,-1,1,1,-1,1,-1],
// 2 24 1 1 1 1 0 1
  [2,24,1,1,1,1,0,1],
// 2 24 1 1 -1 1 0 -1
  [2,24,1,1,-1,1,0,-1],
// 2 24 -1 1 1 -1 0 1
  [2,24,-1,1,1,-1,0,1],
// 2 24 -1 1 -1 -1 0 -1
  [2,24,-1,1,-1,-1,0,-1],
// 4 16 -1 1 -1 -1 1 1 1 1 1 1 1 -1
  [4,16,-1,1,-1,-1,1,1,1,1,1,1,1,-1],
// 4 16 -1 1 1 -1 0 1 1 0 1 1 1 1
  [4,16,-1,1,1,-1,0,1,1,0,1,1,1,1],
// 4 16 1 1 -1 1 0 -1 -1 0 -1 -1 1 -1
  [4,16,1,1,-1,1,0,-1,-1,0,-1,-1,1,-1],
];
module ldraw_lib__box3u2p(step=0, col=false, unit=2/5, alt=false, line=0.2, solid=!$preview)
    makepoly(ldraw_lib__box3u2p(), step=step, col=col, unit=unit, alt=alt, line=line, solid=solid);
ldraw_lib__box3u2p(line=0.2);
// file: s/3003s02.scad
use <../../lib.scad>
use <../../p/box3u2p.scad>
use <../../p/box5.scad>
use <../../p/stud4.scad>
use <../../p/stug-2x2.scad>
function ldraw_lib__s__3003s02() = [
// 0 ~Brick  2 x  2 without Front and Back Faces
// 0 Name: s\3003s02.dat
// 0 Author: Owen Burgoyne [C3POwen]
// 0 !LDRAW_ORG Subpart UPDATE 2013-02
// 0 !LICENSE Licensed under CC BY 2.0 and CC BY 4.0 : see CAreadme.txt
// 
// 0 BFC CERTIFY CCW
  [0,"BFC","CERTIFY"],
  [0,"BFC","CCW"],
// 
// 0 !HISTORY 2013-12-23 [PTadmin] Official Update 2013-02
// 
// 
// 1 16 0 4 0 1 0 0 0 -5 0 0 0 1 stud4.dat
  [1,16,0,4,0,1,0,0,0,-5,0,0,0,1, ldraw_lib__stud4()],
// 0 BFC INVERTNEXT
  [0,"BFC","INVERTNEXT"],
// 1 16 0 24 0 16 0 0 0 -20 0 0 0 16 box5.dat
  [1,16,0,24,0,16,0,0,0,-20,0,0,0,16, ldraw_lib__box5()],
// 4 16 20 24 20 16 24 16 -16 24 16 -20 24 20
  [4,16,20,24,20,16,24,16,-16,24,16,-20,24,20],
// 4 16 -20 24 20 -16 24 16 -16 24 -16 -20 24 -20
  [4,16,-20,24,20,-16,24,16,-16,24,-16,-20,24,-20],
// 4 16 -20 24 -20 -16 24 -16 16 24 -16 20 24 -20
  [4,16,-20,24,-20,-16,24,-16,16,24,-16,20,24,-20],
// 4 16 20 24 -20 16 24 -16 16 24 16 20 24 20
  [4,16,20,24,-20,16,24,-16,16,24,16,20,24,20],
// 2 24 20 24 20 -20 24 20
  [2,24,20,24,20,-20,24,20],
// 2 24 20 24 -20 -20 24 -20
  [2,24,20,24,-20,-20,24,-20],
// 1 16 0 24 0 0 0 20 0 -24 0 -20 0 0 box3u2p.dat
  [1,16,0,24,0,0,0,20,0,-24,0,-20,0,0, ldraw_lib__box3u2p()],
// 1 16 0 0 0 1 0 0 0 1 0 0 0 1 stug-2x2.dat
  [1,16,0,0,0,1,0,0,0,1,0,0,0,1, ldraw_lib__stug_2x2()],
];
module ldraw_lib__s__3003s02(step=0, col=false, unit=2/5, alt=false, line=0.2, solid=!$preview)
    makepoly(ldraw_lib__s__3003s02(), step=step, col=col, unit=unit, alt=alt, line=line, solid=solid);
ldraw_lib__s__3003s02(line=0.2);
// file: s/3003s01.scad
use <../../lib.scad>
use <3003s02.scad>
function ldraw_lib__s__3003s01() = [
// 0 ~Brick  2 x  2 without Front Face
// 0 Name: s\3003s01.dat
// 0 Author: Steffen [Steffen]
// 0 !LDRAW_ORG Subpart UPDATE 2013-02
// 0 !LICENSE Licensed under CC BY 4.0 : see CAreadme.txt
// 
// 0 BFC CERTIFY CCW
  [0,"BFC","CERTIFY"],
  [0,"BFC","CCW"],
// 
// 0 !HISTORY 2009-05-02 [PTadmin] Official Update 2009-01
// 0 !HISTORY 2013-04-02 [Steffen] used s\3003s02.dat
// 0 !HISTORY 2013-12-23 [PTadmin] Official Update 2013-02
// 
// 
// 1 16 0 0 0 1 0 0 0 1 0 0 0 1 s\3003s02.dat
  [1,16,0,0,0,1,0,0,0,1,0,0,0,1, ldraw_lib__s__3003s02()],
// 4 16 20 24 20 -20 24 20 -20 0 20 20 0 20
  [4,16,20,24,20,-20,24,20,-20,0,20,20,0,20],
];
module ldraw_lib__s__3003s01(step=0, col=false, unit=2/5, alt=false, line=0.2, solid=!$preview)
    makepoly(ldraw_lib__s__3003s01(), step=step, col=col, unit=unit, alt=alt, line=line, solid=solid);
ldraw_lib__s__3003s01(line=0.2);
// main file
use <../lib.scad>
use <s/3003s01.scad>
function ldraw_lib__3003p04() = [
// 0 Brick  2 x  2 with Black "4" Pattern
// 0 Name: 3003p04.dat
// 0 Author: Howard Lande [HowardLande]
// 0 !LDRAW_ORG Part UPDATE 2012-03
// 0 !LICENSE Licensed under CC BY 2.0 and CC BY 4.0 : see CAreadme.txt
// 
// 0 BFC CERTIFY CCW
  [0,"BFC","CERTIFY"],
  [0,"BFC","CCW"],
// 
// 0 !KEYWORDS BrickLink 3003pb038, Rebrickable 3003pr0009, Set 850581
// 
// 0 !HISTORY 2012-12-28 [PTadmin] Official Update 2012-03
// 
// 
// 1 16 0 0 0 1 0 0 0 1 0 0 0 1 s\3003s01.dat
  [1,16,0,0,0,1,0,0,0,1,0,0,0,1, ldraw_lib__s__3003s01()],
// 4 0 1 16.4 -20 1 19 -20 3.2 19 -20 3.2 16.4 -20
  [4,0,1,16.4,-20,1,19,-20,3.2,19,-20,3.2,16.4,-20],
// 4 0 1 16.4 -20 3.2 16.4 -20 3.2 14.3 -20 1 14.3 -20
  [4,0,1,16.4,-20,3.2,16.4,-20,3.2,14.3,-20,1,14.3,-20],
// 4 0 1 16.4 -20 1 14.3 -20 -1.9 14.3 -20 -4.9 16.4 -20
  [4,0,1,16.4,-20,1,14.3,-20,-1.9,14.3,-20,-4.9,16.4,-20],
// 4 0 -4.9 16.4 -20 -1.9 14.3 -20 -2.1 14 -20 -4.9 14.3 -20
  [4,0,-4.9,16.4,-20,-1.9,14.3,-20,-2.1,14,-20,-4.9,14.3,-20],
// 4 0 -4.9 14.3 -20 -2.1 14 -20 -2 13.7 -20 0.3 6.2 -20
  [4,0,-4.9,14.3,-20,-2.1,14,-20,-2,13.7,-20,0.3,6.2,-20],
// 3 0 0.3 6.2 -20 -2 13.7 -20 1 9.2 -20
  [3,0,0.3,6.2,-20,-2,13.7,-20,1,9.2,-20],
// 4 0 3.2 6.2 -20 0.3 6.2 -20 1 9.2 -20 3.2 14.3 -20
  [4,0,3.2,6.2,-20,0.3,6.2,-20,1,9.2,-20,3.2,14.3,-20],
// 3 0 1 9.2 -20 1 14.3 -20 3.2 14.3 -20
  [3,0,1,9.2,-20,1,14.3,-20,3.2,14.3,-20],
// 4 0 4.5 16.4 -20 4.5 14.3 -20 3.2 14.3 -20 3.2 16.4 -20
  [4,0,4.5,16.4,-20,4.5,14.3,-20,3.2,14.3,-20,3.2,16.4,-20],
// 4 16 1 14.3 -20 1 9.2 -20 -2 13.7 -20 -1.9 14.3 -20
  [4,16,1,14.3,-20,1,9.2,-20,-2,13.7,-20,-1.9,14.3,-20],
// 3 16 -2 13.7 -20 -2.1 14 -20 -1.9 14.3 -20
  [3,16,-2,13.7,-20,-2.1,14,-20,-1.9,14.3,-20],
// 4 16 5.5 5 -20 3.2 6.2 -20 3.2 14.3 -20 4.5 14.3 -20
  [4,16,5.5,5,-20,3.2,6.2,-20,3.2,14.3,-20,4.5,14.3,-20],
// 4 16 5.5 20 -20 5.5 5 -20 4.5 14.3 -20 4.5 16.4 -20
  [4,16,5.5,20,-20,5.5,5,-20,4.5,14.3,-20,4.5,16.4,-20],
// 4 16 5.5 20 -20 4.5 16.4 -20 3.2 16.4 -20 3.2 19 -20
  [4,16,5.5,20,-20,4.5,16.4,-20,3.2,16.4,-20,3.2,19,-20],
// 4 16 5.5 20 -20 3.2 19 -20 1 19 -20 -5.5 20 -20
  [4,16,5.5,20,-20,3.2,19,-20,1,19,-20,-5.5,20,-20],
// 4 16 -5.5 20 -20 1 19 -20 1 16.4 -20 -4.9 16.4 -20
  [4,16,-5.5,20,-20,1,19,-20,1,16.4,-20,-4.9,16.4,-20],
// 4 16 -5.5 20 -20 -4.9 16.4 -20 -4.9 14.3 -20 -5.5 5 -20
  [4,16,-5.5,20,-20,-4.9,16.4,-20,-4.9,14.3,-20,-5.5,5,-20],
// 3 16 -5.5 5 -20 -4.9 14.3 -20 0.3 6.2 -20
  [3,16,-5.5,5,-20,-4.9,14.3,-20,0.3,6.2,-20],
// 4 16 5.5 5 -20 -5.5 5 -20 0.3 6.2 -20 3.2 6.2 -20
  [4,16,5.5,5,-20,-5.5,5,-20,0.3,6.2,-20,3.2,6.2,-20],
// 4 16 -5.5 20 -20 -5.5 5 -20 -20 0 -20 -20 24 -20
  [4,16,-5.5,20,-20,-5.5,5,-20,-20,0,-20,-20,24,-20],
// 4 16 5.5 20 -20 -5.5 20 -20 -20 24 -20 20 24 -20
  [4,16,5.5,20,-20,-5.5,20,-20,-20,24,-20,20,24,-20],
// 4 16 5.5 5 -20 5.5 20 -20 20 24 -20 20 0 -20
  [4,16,5.5,5,-20,5.5,20,-20,20,24,-20,20,0,-20],
// 4 16 -5.5 5 -20 5.5 5 -20 20 0 -20 -20 0 -20
  [4,16,-5.5,5,-20,5.5,5,-20,20,0,-20,-20,0,-20],
];
module ldraw_lib__3003p04(step=0, col=false, unit=2/5, alt=false, line=0.2, solid=!$preview)
    makepoly(ldraw_lib__3003p04(), step=step, col=col, unit=unit, alt=alt, line=line, solid=solid);
ldraw_lib__3003p04(line=0.2);
